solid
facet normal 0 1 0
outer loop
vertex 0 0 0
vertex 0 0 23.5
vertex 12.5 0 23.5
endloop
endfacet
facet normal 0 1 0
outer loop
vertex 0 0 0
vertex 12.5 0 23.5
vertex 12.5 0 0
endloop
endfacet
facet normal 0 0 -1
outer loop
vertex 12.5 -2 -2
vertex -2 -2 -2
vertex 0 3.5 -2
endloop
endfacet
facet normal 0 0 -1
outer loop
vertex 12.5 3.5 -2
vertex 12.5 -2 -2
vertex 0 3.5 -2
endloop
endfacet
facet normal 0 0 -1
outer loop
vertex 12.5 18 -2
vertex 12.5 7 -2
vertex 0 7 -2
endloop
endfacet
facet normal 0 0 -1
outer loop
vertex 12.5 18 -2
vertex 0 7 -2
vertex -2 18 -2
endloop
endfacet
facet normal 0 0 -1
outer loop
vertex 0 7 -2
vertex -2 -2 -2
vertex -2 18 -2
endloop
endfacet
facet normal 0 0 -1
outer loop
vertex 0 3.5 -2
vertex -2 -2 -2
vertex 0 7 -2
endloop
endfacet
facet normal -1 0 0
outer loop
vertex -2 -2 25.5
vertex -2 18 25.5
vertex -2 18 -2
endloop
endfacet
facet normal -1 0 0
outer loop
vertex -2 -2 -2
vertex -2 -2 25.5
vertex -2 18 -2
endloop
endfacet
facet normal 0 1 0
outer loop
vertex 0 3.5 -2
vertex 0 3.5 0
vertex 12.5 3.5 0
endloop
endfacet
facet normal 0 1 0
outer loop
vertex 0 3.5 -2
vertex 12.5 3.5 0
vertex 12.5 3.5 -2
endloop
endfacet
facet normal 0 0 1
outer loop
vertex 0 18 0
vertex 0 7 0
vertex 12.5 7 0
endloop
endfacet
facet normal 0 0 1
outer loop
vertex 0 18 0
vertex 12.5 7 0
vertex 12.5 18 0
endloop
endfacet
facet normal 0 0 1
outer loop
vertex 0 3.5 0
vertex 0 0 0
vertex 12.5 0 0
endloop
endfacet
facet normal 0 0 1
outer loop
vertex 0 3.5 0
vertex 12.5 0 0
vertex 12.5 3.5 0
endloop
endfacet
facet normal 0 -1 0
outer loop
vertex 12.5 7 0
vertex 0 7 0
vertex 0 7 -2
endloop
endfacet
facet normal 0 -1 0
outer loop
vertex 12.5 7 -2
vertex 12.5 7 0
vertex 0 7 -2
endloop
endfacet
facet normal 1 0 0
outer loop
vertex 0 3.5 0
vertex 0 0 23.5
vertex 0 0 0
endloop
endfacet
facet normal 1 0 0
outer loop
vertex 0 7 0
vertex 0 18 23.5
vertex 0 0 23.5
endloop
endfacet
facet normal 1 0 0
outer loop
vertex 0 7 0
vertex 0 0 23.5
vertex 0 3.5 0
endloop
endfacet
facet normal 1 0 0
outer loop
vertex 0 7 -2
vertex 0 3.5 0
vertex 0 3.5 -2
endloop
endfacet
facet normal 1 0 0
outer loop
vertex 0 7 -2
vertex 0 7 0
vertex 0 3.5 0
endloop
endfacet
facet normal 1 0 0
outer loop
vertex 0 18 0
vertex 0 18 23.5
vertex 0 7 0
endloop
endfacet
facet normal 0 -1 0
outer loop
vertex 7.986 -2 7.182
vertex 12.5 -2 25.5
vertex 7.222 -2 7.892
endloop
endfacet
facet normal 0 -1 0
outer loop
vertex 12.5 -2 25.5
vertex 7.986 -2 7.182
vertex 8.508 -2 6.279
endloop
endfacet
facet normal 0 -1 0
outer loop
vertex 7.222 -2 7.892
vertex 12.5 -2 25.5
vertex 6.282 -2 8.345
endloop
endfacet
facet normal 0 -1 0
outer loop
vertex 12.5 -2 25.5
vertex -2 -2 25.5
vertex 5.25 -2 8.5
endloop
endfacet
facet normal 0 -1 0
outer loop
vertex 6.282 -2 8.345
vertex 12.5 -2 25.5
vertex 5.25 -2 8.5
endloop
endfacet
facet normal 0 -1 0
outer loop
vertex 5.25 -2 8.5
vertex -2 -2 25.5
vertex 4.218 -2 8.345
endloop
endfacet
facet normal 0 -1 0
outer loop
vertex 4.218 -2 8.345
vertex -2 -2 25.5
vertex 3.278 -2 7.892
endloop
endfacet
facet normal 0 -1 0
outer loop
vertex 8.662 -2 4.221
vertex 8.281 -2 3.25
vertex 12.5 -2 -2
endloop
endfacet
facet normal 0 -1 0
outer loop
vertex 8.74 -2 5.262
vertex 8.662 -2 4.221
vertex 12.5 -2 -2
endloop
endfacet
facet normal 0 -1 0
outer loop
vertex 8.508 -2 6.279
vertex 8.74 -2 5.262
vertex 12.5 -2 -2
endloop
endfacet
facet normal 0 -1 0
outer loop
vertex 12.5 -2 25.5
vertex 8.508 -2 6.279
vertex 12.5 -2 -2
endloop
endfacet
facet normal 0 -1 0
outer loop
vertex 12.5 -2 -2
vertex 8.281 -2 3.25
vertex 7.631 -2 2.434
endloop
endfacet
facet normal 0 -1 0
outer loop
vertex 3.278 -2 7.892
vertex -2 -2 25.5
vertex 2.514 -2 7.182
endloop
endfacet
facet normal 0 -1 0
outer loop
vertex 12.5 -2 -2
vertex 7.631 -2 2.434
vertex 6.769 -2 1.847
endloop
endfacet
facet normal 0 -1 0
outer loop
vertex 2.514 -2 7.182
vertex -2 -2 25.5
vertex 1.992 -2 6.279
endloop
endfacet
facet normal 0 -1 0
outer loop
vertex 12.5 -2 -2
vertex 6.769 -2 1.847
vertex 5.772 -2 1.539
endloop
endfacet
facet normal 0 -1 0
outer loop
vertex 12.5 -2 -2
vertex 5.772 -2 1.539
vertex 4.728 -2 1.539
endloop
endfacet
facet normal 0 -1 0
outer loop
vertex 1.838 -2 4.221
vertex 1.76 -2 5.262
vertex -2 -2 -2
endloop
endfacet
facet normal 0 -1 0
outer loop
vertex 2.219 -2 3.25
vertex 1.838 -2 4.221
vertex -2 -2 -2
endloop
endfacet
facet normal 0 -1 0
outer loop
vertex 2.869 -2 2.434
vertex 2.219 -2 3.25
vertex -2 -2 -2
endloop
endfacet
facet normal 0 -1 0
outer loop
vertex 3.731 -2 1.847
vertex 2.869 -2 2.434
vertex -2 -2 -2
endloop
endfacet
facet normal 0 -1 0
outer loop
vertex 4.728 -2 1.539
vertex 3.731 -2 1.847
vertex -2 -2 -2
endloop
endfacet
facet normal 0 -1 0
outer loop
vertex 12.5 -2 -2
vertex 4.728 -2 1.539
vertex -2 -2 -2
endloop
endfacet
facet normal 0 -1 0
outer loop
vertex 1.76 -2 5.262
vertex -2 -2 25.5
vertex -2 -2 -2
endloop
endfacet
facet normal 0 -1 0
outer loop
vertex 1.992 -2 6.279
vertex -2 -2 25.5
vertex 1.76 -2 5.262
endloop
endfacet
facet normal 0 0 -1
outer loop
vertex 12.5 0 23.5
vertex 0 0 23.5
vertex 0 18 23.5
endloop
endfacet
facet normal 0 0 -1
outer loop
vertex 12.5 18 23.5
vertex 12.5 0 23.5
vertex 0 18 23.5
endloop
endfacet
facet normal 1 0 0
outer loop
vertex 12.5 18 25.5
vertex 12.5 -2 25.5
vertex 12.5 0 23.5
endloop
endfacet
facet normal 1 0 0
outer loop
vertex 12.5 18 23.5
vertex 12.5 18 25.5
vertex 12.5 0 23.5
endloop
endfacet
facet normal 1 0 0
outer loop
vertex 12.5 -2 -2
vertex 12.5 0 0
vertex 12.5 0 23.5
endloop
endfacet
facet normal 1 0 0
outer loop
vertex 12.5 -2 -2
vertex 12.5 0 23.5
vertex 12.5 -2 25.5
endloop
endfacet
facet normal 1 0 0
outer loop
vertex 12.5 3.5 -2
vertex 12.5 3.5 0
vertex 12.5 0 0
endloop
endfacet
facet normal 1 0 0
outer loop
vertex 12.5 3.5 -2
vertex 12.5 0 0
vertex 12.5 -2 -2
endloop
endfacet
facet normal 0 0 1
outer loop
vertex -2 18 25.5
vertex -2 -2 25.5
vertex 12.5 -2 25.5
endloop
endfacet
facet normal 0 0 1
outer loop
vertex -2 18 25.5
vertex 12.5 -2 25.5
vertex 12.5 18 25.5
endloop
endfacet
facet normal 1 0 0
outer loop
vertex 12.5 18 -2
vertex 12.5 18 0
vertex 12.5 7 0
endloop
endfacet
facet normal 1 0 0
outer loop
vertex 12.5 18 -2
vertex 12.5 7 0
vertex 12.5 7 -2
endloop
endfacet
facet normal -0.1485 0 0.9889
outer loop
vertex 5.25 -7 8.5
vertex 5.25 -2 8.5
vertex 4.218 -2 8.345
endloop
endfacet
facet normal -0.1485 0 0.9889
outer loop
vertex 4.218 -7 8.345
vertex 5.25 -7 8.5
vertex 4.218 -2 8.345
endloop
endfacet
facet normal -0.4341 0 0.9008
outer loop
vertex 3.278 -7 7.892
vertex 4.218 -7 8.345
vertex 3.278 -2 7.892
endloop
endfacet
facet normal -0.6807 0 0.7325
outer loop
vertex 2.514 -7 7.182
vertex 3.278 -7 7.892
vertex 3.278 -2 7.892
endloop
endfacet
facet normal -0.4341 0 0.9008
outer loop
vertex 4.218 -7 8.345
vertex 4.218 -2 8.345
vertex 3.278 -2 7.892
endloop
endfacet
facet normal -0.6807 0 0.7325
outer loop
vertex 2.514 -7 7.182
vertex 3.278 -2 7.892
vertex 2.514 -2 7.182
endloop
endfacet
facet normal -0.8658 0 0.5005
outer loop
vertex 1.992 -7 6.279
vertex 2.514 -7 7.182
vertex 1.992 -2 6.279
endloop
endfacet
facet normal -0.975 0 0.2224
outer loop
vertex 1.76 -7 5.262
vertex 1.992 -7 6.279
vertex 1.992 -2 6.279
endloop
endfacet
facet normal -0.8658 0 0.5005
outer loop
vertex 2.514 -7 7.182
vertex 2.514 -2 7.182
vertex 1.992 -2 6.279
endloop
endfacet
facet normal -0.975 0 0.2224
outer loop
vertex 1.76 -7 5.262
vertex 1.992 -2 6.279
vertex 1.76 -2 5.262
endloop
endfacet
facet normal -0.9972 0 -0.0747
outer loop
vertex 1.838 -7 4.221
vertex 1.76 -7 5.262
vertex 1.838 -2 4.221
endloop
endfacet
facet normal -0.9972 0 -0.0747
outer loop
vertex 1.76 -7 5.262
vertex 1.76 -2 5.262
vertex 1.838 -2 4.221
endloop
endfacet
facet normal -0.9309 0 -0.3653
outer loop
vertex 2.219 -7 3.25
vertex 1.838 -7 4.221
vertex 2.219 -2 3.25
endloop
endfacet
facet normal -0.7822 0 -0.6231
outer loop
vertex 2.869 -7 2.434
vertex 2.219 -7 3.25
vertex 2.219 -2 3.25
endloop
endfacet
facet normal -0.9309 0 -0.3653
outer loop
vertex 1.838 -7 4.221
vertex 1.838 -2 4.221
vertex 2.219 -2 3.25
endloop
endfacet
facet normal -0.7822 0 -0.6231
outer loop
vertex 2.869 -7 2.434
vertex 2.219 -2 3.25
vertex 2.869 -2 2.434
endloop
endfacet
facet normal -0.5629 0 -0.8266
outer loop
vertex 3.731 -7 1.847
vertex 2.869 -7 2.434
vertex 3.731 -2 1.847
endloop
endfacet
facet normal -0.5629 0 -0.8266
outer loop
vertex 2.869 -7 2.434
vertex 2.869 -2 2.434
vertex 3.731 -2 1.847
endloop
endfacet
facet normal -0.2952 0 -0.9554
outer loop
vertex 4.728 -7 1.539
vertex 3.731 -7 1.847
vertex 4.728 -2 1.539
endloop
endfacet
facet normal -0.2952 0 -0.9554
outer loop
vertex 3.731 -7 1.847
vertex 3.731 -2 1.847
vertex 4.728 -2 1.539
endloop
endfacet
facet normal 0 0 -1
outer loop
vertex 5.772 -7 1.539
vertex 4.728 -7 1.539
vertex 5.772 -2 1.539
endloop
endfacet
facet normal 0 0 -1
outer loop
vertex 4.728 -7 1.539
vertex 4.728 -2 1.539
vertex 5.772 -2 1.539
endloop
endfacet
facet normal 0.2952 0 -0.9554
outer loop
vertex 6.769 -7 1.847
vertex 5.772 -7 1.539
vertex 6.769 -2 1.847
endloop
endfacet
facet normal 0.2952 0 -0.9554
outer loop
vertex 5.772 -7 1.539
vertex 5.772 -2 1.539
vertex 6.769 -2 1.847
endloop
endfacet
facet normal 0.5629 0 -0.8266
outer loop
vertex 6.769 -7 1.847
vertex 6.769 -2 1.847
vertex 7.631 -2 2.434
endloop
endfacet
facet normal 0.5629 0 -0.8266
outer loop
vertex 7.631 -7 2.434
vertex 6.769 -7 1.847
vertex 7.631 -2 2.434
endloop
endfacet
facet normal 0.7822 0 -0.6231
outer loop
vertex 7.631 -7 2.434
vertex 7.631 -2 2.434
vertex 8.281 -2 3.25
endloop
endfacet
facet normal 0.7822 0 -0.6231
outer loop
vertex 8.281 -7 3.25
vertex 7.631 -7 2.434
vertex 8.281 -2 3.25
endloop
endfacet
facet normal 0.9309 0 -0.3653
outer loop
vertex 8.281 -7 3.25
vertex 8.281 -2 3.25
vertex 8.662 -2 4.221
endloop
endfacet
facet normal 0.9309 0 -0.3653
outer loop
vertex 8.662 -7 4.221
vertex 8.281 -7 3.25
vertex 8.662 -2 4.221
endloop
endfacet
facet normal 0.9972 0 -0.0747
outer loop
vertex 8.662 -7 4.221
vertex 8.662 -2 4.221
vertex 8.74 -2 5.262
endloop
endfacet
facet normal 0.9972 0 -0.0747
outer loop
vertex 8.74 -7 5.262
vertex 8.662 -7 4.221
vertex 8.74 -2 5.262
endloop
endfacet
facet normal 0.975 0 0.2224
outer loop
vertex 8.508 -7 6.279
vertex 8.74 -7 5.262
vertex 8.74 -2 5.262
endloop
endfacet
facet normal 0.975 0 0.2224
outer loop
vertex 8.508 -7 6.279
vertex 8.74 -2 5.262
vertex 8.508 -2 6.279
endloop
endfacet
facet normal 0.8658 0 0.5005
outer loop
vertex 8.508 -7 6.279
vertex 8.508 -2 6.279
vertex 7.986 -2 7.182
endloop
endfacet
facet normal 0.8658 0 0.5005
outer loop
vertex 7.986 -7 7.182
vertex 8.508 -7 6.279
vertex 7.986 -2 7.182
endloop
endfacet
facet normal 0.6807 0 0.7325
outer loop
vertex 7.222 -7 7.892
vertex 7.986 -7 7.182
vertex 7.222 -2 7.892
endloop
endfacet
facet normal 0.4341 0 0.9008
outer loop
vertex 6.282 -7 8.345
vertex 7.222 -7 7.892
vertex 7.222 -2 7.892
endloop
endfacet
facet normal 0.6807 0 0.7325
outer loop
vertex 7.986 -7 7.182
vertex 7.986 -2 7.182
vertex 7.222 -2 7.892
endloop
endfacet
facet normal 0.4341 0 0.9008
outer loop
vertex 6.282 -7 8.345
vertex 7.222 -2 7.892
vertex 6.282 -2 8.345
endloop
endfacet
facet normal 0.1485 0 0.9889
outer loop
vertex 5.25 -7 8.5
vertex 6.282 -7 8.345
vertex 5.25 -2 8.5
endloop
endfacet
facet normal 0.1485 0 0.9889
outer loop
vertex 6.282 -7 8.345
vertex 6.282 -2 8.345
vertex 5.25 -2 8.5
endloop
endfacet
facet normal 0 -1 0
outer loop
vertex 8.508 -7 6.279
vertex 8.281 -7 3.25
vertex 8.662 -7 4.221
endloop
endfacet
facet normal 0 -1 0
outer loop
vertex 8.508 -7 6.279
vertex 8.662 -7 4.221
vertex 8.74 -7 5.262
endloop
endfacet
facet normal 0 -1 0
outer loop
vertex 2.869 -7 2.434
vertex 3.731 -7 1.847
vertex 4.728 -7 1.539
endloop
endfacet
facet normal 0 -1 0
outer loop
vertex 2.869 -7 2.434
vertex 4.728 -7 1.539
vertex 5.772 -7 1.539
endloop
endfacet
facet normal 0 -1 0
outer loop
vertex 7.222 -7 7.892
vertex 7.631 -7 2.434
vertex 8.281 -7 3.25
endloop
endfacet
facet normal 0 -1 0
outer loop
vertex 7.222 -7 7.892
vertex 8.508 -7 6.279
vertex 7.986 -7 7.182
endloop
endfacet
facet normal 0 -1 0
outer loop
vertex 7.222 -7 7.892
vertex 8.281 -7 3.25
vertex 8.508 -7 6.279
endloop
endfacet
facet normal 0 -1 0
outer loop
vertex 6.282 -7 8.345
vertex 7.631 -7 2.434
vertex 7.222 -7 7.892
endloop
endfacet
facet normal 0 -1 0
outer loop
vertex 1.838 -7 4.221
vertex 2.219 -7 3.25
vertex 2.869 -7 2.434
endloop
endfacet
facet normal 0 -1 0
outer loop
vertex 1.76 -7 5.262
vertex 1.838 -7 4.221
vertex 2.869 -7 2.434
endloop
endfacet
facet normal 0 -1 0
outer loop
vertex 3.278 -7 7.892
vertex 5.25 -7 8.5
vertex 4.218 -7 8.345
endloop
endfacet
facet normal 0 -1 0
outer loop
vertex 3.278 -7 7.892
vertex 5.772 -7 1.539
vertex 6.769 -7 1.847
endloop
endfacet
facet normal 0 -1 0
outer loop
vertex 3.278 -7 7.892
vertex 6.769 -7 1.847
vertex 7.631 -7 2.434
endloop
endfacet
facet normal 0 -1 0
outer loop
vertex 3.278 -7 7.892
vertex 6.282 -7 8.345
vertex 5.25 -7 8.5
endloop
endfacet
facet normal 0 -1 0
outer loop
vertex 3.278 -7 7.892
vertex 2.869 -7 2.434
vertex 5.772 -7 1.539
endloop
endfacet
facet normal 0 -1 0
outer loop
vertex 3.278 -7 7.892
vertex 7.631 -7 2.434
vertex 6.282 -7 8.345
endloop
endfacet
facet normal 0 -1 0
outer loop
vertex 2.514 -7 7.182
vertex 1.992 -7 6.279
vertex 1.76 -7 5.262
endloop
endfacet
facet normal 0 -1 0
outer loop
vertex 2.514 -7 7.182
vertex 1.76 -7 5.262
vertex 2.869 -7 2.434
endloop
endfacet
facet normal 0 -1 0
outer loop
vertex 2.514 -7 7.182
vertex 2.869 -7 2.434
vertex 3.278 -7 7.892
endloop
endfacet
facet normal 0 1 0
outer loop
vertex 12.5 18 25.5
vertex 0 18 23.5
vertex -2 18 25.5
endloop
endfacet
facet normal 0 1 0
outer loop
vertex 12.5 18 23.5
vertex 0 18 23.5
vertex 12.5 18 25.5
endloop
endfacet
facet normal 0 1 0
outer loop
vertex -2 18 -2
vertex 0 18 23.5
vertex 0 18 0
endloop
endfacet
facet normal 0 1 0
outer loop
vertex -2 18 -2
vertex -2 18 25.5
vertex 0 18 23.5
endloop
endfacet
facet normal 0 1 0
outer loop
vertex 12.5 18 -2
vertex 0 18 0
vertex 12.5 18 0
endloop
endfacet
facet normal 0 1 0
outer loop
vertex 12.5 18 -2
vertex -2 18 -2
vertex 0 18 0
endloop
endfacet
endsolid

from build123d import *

# Parameters (mm, degrees)
SKETCH_2_W          = 23.5
SKETCH_2_H          = 18
EXTRUDE_1_DEPTH     = 12.5
SHELL_7_T           = 2
SKETCH_4_W          = 2
SKETCH_4_H          = 3.5
CUT_EXTRUDE_3_DEPTH = 35.734708866
SKETCH_8_W          = 14.567673111
SKETCH_8_H          = 27.5
CUT_EXTRUDE_5_DEPTH = 2
SKETCH_7_R          = 3.5
EXTRUDE_2_DEPTH     = 5


with BuildPart() as part:
    # Эскиз2 → Бобышка-Вытянуть1 (new body)
    with BuildSketch(Plane(origin=(0, 0, 0), x_dir=(0, 0, -1), z_dir=(1, 0, 0))):
        with Locations((-11.75, 9)):
            Rectangle(SKETCH_2_W, SKETCH_2_H)
    extrude(amount=EXTRUDE_1_DEPTH)

    # Оболочка7
    shell_7_openings = [part.faces().sort_by_distance(p)[0] for p in [
        (12.5, 9, 11.75),
    ]]
    offset(amount=SHELL_7_T, openings=shell_7_openings, kind=Kind.INTERSECTION)

    # Эскиз4 → Вырез-Вытянуть3 (cut, through all)
    with BuildSketch(Plane(origin=(0, 0, 0), x_dir=(0, 0, -1), z_dir=(1, 0, 0))):
        with Locations((1, 5.25)):
            Rectangle(SKETCH_4_W, SKETCH_4_H)
    extrude(amount=CUT_EXTRUDE_3_DEPTH, mode=Mode.SUBTRACT)

    # Эскиз8 → Вырез-Вытянуть5 (cut)
    with BuildSketch(Plane(origin=(0, 20, 0), x_dir=(1, 0, 0), z_dir=(0, 1, 0))):
        with Locations((5.283836556, -11.75)):
            Rectangle(SKETCH_8_W, SKETCH_8_H)
    extrude(amount=-CUT_EXTRUDE_5_DEPTH, mode=Mode.SUBTRACT)

    # Эскиз7 → Бобышка-Вытянуть2 (add)
    with BuildSketch(Plane.XZ.offset(2)):
        with Locations(Location((5.25, 5, 0), (0, 0, 90))):
            Circle(SKETCH_7_R)
    extrude(amount=EXTRUDE_2_DEPTH)


solid = part.part
